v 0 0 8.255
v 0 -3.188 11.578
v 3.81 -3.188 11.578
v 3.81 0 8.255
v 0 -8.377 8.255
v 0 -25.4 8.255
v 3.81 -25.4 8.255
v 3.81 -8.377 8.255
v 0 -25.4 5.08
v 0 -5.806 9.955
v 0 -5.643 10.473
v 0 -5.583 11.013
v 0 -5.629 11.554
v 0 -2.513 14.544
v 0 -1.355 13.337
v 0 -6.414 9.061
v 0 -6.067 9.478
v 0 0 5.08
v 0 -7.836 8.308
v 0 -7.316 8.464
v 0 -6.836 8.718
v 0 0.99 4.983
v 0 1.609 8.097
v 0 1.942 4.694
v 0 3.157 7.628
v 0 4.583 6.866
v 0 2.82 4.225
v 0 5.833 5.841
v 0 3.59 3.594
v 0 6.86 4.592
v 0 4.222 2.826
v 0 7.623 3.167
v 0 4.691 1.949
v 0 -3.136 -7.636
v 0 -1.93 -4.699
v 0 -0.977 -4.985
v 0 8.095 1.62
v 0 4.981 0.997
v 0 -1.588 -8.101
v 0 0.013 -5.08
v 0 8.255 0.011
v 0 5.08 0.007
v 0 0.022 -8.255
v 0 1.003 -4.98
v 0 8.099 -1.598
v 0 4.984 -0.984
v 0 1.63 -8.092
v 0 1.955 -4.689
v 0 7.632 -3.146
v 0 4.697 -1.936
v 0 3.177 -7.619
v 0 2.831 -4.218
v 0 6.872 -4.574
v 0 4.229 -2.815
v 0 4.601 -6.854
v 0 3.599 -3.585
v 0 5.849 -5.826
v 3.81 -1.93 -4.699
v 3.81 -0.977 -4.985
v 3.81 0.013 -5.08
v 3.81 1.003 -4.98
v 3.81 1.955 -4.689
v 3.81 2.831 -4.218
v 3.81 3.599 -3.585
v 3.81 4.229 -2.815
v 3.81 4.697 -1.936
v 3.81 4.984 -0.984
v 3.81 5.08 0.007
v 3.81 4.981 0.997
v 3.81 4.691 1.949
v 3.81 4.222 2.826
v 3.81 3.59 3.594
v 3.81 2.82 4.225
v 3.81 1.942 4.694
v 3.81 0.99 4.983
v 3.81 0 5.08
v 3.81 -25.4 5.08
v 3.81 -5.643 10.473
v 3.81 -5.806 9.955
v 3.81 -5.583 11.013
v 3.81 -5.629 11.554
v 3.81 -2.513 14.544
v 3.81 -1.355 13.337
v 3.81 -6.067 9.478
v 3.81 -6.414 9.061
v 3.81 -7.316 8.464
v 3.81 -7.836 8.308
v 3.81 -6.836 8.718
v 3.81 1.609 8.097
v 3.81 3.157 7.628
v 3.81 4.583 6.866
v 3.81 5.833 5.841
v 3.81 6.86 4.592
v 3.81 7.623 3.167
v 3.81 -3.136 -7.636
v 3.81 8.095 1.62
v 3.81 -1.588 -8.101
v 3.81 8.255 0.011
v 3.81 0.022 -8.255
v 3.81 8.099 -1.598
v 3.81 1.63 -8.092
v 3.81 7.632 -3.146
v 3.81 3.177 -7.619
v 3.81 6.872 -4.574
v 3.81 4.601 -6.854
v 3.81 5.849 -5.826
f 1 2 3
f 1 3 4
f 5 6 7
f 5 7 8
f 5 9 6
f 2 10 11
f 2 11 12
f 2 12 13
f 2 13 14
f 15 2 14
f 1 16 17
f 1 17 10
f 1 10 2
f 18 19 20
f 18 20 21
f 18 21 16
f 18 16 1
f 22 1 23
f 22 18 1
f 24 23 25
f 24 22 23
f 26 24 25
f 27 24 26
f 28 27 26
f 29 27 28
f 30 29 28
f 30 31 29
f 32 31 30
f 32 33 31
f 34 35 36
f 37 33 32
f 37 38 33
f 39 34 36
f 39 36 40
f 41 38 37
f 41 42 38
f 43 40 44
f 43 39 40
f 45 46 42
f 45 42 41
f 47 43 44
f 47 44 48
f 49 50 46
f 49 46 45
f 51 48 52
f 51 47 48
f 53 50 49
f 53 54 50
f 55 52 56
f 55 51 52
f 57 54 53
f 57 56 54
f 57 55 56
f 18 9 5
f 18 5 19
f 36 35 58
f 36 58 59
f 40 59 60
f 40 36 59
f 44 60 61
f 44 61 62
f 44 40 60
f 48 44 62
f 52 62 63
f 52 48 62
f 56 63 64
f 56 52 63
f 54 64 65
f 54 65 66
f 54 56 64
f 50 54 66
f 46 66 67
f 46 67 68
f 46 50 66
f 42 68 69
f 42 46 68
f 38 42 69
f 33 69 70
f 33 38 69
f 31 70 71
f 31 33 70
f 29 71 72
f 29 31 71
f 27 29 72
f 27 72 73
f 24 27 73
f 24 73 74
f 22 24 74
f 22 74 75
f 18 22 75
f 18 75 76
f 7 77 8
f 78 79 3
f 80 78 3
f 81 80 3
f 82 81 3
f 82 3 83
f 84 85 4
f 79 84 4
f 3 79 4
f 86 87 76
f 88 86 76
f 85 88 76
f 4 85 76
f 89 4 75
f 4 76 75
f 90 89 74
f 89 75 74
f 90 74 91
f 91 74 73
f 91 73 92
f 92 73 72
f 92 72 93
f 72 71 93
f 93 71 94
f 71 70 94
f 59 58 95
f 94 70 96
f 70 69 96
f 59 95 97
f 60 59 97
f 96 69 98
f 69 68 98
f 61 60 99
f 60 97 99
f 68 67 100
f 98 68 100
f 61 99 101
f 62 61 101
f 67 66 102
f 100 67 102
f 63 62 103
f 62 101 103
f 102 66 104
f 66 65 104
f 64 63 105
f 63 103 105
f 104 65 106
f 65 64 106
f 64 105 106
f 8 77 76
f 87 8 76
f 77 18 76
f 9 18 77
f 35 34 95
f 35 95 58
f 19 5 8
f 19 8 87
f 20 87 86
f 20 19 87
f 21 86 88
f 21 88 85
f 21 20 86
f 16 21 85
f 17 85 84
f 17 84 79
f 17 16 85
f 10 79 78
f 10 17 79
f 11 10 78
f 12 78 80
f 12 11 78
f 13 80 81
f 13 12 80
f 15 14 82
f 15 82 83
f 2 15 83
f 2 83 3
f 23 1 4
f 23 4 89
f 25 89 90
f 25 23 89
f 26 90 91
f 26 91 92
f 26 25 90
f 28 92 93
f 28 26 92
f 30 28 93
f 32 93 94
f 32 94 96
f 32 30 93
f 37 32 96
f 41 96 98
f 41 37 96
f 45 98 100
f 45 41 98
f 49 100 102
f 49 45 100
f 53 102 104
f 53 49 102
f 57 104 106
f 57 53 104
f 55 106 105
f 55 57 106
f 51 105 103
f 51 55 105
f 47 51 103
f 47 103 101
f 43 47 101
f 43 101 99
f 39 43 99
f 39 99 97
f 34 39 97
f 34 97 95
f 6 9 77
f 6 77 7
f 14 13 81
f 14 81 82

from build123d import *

# Parameters (mm, degrees)
BOSS_EXTRUDE1_DEPTH = 3.81
FILLET1_R           = 2.794


with BuildPart() as part:
    # Sketch1 → Boss-Extrude1 (new body)
    with BuildSketch(Plane(origin=(0, 0, 0), x_dir=(0, 0, -1), z_dir=(1, 0, 0))):
        with BuildLine():
            Line((-5.08, 0), (-5.08, -25.4))
            Line((-5.08, -25.4), (-8.255, -25.4))
            Line((-8.255, -25.4), (-8.255, -2.463960679))
            Line((-8.255, -2.463960679), (-11.554166285, -5.629191448))
            Line((-11.554166285, -5.629191448), (-14.543550901, -2.513312179))
            Line((-14.543550901, -2.513312179), (-13.336585788, -1.355345959))
            Line((-13.336585788, -1.355345959), (-11.57812425, -3.188216118))
            Line((-11.57812425, -3.188216118), (-8.255, 0))
            ThreePointArc((-8.255, 0), (1.598457615, 8.098762761), (7.635965052, -3.136409209))
            Line((7.635965052, -3.136409209), (4.699055417, -1.930097975))
            ThreePointArc((4.699055417, -1.930097975), (0.983666225, 4.983854007), (-5.08, 0))
        make_face()
    extrude(amount=BOSS_EXTRUDE1_DEPTH)

    # Fillet1
    # the kernel refuses this fillet: 2.794 mm, written as the material it adds along each edge
    with BuildSketch(Plane(origin=(0, -2.463960679, 8.255), x_dir=(0, -1, 0), z_dir=(1, 0, 0))) as fillet1_piece_1:
        with BuildLine():
            CenterArc((5.913183284, -2.794), FILLET1_R, 90, 100.416592131)
            Line((3.165230769, -3.299166285), (3.110271719, -3.309269611))
            ThreePointArc((3.110271719, -3.309269611), (1.542292241, -1.688269296), (-0.040323143, -0.038686154))
            Line((-0.040323143, -0.038686154), (0, 0.05588))
            Line((0, 0.05588), (5.913183284, 0.05588))
            Line((5.913183284, 0.05588), (5.913183284, 0))
        make_face()
    extrude(amount=3.81)


solid = part.part
